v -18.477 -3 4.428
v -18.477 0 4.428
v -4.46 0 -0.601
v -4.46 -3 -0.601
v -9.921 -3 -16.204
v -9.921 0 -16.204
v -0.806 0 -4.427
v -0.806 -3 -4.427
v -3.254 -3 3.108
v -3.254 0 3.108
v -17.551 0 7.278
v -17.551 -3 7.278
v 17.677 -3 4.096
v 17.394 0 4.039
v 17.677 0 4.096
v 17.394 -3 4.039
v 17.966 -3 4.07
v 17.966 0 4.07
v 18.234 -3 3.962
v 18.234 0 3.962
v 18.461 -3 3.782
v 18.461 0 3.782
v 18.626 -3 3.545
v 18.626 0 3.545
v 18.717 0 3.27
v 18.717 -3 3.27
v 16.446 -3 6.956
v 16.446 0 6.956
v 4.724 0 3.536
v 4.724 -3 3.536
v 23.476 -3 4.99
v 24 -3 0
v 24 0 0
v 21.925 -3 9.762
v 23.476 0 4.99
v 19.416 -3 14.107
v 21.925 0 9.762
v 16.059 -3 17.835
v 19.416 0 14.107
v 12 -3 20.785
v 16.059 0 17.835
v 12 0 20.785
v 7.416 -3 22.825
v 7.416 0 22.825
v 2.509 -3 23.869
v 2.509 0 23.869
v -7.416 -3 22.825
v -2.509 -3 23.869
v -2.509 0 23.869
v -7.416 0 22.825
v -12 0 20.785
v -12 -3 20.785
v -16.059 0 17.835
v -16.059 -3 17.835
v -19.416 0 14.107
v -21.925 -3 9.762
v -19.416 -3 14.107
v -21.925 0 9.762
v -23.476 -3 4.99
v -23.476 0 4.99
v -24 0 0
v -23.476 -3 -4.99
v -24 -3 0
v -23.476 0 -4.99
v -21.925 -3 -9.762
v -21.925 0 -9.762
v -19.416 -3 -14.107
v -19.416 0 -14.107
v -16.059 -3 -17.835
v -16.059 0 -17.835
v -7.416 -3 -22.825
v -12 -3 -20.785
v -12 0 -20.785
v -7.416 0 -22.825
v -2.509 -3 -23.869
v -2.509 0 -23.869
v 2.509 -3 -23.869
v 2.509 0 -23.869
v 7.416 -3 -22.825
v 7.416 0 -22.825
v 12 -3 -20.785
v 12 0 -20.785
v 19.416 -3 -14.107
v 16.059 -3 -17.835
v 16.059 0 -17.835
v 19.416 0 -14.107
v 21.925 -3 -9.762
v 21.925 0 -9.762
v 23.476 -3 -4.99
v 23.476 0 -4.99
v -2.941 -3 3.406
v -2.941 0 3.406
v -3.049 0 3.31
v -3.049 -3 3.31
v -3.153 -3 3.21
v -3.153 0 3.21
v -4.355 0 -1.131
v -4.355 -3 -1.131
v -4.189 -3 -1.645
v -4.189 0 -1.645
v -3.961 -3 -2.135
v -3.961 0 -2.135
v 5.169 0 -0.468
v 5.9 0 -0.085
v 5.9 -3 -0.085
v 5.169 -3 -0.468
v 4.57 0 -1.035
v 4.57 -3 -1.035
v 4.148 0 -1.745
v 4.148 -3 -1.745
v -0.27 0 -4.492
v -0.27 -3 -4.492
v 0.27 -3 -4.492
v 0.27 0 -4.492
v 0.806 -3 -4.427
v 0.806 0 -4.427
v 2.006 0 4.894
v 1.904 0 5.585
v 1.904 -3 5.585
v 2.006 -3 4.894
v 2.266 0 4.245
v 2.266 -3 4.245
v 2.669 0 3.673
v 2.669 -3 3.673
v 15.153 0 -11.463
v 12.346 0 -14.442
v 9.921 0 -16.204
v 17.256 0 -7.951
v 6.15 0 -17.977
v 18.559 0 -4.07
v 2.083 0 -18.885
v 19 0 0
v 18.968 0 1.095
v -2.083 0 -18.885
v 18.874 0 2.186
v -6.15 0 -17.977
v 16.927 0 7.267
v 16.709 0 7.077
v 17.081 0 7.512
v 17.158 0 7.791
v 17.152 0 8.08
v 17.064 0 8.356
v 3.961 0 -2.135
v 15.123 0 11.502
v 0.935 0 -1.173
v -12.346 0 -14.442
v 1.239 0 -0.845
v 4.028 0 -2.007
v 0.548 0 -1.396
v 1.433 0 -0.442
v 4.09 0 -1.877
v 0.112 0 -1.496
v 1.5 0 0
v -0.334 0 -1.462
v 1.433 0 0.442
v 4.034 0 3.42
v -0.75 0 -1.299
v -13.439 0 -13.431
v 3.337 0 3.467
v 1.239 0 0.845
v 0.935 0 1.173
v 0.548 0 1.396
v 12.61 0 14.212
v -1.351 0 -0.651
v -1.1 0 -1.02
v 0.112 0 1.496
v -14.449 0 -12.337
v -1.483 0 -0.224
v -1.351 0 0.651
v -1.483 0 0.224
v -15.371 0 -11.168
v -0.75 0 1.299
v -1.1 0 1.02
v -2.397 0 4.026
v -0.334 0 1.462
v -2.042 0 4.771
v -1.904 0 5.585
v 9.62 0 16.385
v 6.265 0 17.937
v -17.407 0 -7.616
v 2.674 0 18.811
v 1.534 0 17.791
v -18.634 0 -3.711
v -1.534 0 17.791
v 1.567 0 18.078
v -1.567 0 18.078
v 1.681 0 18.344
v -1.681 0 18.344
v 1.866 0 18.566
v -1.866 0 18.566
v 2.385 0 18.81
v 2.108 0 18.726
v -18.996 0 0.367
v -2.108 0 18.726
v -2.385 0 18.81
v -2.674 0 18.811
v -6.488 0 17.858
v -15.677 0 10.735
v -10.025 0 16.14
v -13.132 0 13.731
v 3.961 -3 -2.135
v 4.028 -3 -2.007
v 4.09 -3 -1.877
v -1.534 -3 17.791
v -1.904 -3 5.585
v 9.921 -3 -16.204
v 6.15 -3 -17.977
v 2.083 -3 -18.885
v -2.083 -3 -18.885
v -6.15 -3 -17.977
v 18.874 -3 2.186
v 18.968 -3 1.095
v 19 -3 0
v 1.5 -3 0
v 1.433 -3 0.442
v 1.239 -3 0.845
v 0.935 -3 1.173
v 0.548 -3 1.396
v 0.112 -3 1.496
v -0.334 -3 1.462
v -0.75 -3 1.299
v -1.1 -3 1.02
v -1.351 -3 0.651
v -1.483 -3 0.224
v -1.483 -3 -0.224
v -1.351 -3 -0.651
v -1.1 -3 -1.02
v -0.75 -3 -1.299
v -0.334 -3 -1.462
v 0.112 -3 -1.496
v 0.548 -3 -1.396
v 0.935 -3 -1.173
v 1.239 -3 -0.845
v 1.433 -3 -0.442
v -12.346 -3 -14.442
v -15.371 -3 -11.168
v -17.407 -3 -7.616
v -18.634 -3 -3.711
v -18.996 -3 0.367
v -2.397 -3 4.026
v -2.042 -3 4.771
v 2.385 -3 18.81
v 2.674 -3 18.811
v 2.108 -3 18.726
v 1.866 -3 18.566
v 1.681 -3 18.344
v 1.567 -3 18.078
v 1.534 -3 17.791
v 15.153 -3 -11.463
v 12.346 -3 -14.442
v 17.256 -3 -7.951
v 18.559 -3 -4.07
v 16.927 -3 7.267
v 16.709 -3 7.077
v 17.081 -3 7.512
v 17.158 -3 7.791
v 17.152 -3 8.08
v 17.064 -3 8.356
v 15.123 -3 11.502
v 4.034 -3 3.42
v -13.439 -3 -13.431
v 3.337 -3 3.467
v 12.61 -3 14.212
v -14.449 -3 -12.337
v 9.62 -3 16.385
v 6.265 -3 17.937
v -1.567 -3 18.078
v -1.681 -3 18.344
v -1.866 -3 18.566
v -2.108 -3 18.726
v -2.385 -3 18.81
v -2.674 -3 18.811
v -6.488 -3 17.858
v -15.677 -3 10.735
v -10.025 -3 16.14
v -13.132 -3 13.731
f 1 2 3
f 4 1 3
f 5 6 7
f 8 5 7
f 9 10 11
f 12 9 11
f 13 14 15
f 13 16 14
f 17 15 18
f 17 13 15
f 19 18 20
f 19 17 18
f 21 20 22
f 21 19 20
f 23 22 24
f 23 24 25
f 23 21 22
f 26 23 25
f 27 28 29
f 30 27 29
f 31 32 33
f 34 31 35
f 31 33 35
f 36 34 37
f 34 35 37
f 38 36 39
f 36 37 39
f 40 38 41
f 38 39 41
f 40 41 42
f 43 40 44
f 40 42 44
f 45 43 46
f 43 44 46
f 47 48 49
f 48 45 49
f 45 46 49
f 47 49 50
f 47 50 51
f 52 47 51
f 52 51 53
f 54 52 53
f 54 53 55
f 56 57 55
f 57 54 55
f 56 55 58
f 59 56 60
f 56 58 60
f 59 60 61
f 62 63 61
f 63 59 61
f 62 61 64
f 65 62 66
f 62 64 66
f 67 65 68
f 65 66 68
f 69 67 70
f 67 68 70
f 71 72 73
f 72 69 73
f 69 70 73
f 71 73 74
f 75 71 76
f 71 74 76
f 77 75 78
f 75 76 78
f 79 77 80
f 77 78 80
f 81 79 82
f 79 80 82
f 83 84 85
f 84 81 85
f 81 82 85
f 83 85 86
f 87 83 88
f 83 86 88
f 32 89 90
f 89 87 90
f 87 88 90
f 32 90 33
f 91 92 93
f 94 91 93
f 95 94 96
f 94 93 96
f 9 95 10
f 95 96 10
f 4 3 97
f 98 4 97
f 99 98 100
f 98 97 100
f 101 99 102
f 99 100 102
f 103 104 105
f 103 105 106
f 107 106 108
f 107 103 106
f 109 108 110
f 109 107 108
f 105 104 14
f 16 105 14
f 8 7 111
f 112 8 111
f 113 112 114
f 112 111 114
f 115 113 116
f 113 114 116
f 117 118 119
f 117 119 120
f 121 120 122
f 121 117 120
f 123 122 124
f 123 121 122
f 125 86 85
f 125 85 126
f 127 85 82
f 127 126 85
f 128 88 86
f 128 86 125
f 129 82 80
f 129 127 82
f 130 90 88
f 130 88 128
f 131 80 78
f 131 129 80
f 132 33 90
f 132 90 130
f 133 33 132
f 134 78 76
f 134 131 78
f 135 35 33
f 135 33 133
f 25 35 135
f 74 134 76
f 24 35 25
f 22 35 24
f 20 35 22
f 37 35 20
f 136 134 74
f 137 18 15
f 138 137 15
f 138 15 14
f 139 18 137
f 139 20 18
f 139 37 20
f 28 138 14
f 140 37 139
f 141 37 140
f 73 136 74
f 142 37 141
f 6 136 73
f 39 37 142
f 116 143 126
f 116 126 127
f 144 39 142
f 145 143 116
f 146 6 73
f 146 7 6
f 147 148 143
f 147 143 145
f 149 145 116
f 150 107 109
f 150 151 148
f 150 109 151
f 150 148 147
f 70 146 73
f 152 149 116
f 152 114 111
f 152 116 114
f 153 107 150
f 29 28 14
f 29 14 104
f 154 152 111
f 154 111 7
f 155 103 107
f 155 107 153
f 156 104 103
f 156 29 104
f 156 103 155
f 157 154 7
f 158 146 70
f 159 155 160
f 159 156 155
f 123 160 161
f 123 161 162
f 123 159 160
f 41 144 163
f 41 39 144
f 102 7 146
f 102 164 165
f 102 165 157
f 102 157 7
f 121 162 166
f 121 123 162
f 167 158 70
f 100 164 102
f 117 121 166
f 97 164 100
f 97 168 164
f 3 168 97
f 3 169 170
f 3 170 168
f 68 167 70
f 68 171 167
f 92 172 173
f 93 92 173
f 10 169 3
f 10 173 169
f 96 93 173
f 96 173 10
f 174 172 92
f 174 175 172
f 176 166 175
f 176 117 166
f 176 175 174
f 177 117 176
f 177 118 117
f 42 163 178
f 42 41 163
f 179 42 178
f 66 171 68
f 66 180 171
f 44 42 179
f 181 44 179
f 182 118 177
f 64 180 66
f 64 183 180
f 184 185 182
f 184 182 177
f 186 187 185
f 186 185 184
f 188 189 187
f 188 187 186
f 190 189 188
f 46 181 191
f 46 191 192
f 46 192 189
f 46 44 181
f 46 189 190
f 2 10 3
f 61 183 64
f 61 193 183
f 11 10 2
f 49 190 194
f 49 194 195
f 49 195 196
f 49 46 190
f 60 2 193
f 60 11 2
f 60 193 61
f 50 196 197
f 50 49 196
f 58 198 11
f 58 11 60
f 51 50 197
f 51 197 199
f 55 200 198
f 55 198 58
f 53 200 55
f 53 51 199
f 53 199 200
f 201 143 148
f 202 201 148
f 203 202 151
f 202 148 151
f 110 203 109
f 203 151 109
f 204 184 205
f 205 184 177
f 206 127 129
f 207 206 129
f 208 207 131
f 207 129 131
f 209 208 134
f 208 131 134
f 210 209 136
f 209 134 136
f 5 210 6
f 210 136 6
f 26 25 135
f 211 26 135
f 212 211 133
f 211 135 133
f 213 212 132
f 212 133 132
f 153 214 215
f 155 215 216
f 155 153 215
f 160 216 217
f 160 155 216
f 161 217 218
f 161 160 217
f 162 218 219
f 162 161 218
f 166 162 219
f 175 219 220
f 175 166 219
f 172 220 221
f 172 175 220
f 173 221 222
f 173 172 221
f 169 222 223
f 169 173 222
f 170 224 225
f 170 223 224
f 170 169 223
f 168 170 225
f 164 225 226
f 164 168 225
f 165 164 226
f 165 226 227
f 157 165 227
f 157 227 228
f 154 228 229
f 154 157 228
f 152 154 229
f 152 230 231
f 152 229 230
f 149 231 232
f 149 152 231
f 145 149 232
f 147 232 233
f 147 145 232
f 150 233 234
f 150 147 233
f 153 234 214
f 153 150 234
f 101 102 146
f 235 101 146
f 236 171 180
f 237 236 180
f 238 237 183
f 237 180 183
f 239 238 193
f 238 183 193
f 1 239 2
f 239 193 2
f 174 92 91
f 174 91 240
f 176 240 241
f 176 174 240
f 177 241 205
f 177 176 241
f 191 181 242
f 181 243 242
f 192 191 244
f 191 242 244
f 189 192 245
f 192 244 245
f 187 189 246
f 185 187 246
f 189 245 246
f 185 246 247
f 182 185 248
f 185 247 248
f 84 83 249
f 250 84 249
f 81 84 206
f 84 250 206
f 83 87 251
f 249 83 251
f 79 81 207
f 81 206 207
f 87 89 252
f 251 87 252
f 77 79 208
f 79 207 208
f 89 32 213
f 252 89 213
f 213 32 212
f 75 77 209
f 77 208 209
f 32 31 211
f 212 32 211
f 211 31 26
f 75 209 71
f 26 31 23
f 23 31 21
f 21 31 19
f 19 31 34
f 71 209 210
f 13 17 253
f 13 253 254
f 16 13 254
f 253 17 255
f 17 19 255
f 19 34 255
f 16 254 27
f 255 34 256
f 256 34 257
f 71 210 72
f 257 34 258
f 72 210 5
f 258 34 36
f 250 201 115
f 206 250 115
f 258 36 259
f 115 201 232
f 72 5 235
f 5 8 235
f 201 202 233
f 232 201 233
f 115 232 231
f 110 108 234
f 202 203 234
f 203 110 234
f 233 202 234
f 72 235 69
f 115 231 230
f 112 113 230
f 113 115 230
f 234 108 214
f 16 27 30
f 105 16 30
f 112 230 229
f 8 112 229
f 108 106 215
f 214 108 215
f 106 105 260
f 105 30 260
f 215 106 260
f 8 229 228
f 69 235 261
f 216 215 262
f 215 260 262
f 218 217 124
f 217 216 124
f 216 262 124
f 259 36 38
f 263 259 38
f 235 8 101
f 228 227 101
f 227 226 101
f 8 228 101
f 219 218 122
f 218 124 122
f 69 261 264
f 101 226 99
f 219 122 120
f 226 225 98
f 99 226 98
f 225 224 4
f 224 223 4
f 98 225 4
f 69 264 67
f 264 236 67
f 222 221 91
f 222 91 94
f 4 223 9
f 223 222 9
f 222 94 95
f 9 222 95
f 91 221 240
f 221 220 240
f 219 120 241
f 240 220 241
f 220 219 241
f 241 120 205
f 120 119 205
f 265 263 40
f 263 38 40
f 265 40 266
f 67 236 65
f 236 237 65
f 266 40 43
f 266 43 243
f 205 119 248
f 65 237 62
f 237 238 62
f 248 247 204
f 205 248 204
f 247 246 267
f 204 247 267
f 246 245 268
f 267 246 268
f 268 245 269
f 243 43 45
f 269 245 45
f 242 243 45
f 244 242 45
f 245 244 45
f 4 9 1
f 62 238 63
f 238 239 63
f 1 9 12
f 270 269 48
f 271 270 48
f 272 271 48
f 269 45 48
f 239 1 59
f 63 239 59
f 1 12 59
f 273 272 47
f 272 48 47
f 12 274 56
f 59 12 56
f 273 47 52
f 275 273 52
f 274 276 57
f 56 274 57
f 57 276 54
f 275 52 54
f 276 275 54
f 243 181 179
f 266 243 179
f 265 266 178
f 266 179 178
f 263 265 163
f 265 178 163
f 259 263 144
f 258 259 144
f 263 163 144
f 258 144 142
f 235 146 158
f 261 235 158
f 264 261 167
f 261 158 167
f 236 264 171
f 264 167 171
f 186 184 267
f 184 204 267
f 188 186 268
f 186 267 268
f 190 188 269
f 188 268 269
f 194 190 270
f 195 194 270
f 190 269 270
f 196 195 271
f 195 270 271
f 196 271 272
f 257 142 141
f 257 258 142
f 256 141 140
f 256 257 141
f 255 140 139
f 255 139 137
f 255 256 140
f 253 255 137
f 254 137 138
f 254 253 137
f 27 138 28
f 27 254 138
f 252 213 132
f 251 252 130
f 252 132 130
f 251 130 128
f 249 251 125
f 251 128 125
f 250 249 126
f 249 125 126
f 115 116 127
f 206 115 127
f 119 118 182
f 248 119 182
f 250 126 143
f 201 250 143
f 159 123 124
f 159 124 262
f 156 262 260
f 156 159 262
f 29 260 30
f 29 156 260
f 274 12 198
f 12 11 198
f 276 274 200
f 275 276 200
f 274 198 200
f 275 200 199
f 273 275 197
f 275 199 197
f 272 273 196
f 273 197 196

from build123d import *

# Parameters (mm, degrees)
F0_R        = 24
F0_R_2      = 1.5
F1_DEPTH    = 3
F2_COUNT    = 5
F3_T1_DEPTH = 3
F4_R        = 1


# Not quite as in the source:
# - a fillet or chamfer that OpenCascade refuses, or shapes differently, is made with other operations: its cross-section is extruded or revolved along the edge and cut away or added


with BuildPart() as f1:
    # F0 (on Front) → F1 (new body)
    with BuildSketch(Plane.XZ):
        Circle(F0_R)
        with BuildLine():
            ThreePointArc((-1.4988309156, 18.9407894737), (0, 19), (1.4988309156, 18.9407894737))
            ThreePointArc((1.4988309156, 18.9407894737), (13.9548878067, 12.8942276349), (19, 0))
            ThreePointArc((19, 0), (-12.8942276349, -13.9548878067), (-1.4988309156, 18.9407894737))
        make_face(mode=Mode.SUBTRACT)
        with BuildLine():
            ThreePointArc((-1.9499920861, 4.0555555556), (-2.3953116303, -3.8095251927), (4.5, 0))
            ThreePointArc((4.5, 0), (3.8095251927, 2.3953116303), (1.9499920861, 4.0555555556))
            ThreePointArc((1.9499920861, 4.0555555556), (0, 4.5), (-1.9499920861, 4.0555555556))
        make_face()
        Circle(F0_R_2, mode=Mode.SUBTRACT)
        with BuildLine():
            ThreePointArc((-1.9499920861, 4.0555555556), (0, 4.5), (1.9499920861, 4.0555555556))
            Line((1.9499920861, 4.0555555556), (1.4988309156, 18.9407894737))
            ThreePointArc((1.4988309156, 18.9407894737), (0, 19), (-1.4988309156, 18.9407894737))
            Line((-1.4988309156, 18.9407894737), (-1.9499920861, 4.0555555556))
        make_face()
    extrude(amount=F1_DEPTH)

    # F2: F1 ×5 about axis
    f2_axis = Axis((0, 0, 0), (0, 1, 0))


with BuildPart() as f1_1:
    add(f1.part)
    for i in range(1, F2_COUNT):
        add(f1.part.rotate(f2_axis, i * 360 / F2_COUNT))

    # F3: fillet of radius 3 on 4 edges, made by hand

    # F3_s2 → F3_t1 (join)
    with BuildSketch(Plane.XZ):
        with BuildLine():
            ThreePointArc((-2.9413516087, 3.4056498225), (-2.1935950838, 4.3864419946), (-1.903629714, 5.5851968442))
            Line((-1.903629714, 5.5851968442), (-1.9499920861, 4.0555555556))
            ThreePointArc((-1.9499920861, 4.0555555556), (-2.467165408, 3.7633887454), (-2.9413516087, 3.4056498225))
        make_face()
        with BuildLine():
            ThreePointArc((2.3300378224, 3.8497952863), (3.4938960826, 3.4417180197), (4.7235839209, 3.5363801859))
            Line((4.7235839209, 3.5363801859), (3.2544818448, 3.1077882685))
            ThreePointArc((3.2544818448, 3.1077882685), (2.8167993507, 3.5093648169), (2.3300378224, 3.8497952863))
        make_face()
        with BuildLine():
            ThreePointArc((1.903629714, 5.5851968442), (2.1935950838, 4.3864419946), (2.9413516087, 3.4056498225))
            ThreePointArc((2.9413516087, 3.4056498225), (2.467165408, 3.7633887454), (1.9499920861, 4.0555555556))
            Line((1.9499920861, 4.0555555556), (1.903629714, 5.5851968442))
        make_face()
        with BuildLine():
            ThreePointArc((5.9000917861, -0.0845387023), (4.8496124019, -0.7307477774), (4.1478930895, -1.7449879421))
            ThreePointArc((4.1478930895, -1.7449879421), (4.3415914287, -1.1834626593), (4.4596432318, -0.6013170919))
            Line((4.4596432318, -0.6013170919), (5.9000917861, -0.0845387023))
        make_face()
    extrude(amount=F3_T1_DEPTH)

    # F4
    f4_edges = [f1_1.edges().sort_by_distance(p)[0] for p in [
        (-1.498831, -1.5, 18.940789),
        (17.550597, -1.5, 7.278499),
        (18.476925, -1.5, 4.427553),
        (1.498831, -1.5, 18.940789),
    ]]
    fillet(f4_edges, radius=F4_R)


solid = f1_1.part
